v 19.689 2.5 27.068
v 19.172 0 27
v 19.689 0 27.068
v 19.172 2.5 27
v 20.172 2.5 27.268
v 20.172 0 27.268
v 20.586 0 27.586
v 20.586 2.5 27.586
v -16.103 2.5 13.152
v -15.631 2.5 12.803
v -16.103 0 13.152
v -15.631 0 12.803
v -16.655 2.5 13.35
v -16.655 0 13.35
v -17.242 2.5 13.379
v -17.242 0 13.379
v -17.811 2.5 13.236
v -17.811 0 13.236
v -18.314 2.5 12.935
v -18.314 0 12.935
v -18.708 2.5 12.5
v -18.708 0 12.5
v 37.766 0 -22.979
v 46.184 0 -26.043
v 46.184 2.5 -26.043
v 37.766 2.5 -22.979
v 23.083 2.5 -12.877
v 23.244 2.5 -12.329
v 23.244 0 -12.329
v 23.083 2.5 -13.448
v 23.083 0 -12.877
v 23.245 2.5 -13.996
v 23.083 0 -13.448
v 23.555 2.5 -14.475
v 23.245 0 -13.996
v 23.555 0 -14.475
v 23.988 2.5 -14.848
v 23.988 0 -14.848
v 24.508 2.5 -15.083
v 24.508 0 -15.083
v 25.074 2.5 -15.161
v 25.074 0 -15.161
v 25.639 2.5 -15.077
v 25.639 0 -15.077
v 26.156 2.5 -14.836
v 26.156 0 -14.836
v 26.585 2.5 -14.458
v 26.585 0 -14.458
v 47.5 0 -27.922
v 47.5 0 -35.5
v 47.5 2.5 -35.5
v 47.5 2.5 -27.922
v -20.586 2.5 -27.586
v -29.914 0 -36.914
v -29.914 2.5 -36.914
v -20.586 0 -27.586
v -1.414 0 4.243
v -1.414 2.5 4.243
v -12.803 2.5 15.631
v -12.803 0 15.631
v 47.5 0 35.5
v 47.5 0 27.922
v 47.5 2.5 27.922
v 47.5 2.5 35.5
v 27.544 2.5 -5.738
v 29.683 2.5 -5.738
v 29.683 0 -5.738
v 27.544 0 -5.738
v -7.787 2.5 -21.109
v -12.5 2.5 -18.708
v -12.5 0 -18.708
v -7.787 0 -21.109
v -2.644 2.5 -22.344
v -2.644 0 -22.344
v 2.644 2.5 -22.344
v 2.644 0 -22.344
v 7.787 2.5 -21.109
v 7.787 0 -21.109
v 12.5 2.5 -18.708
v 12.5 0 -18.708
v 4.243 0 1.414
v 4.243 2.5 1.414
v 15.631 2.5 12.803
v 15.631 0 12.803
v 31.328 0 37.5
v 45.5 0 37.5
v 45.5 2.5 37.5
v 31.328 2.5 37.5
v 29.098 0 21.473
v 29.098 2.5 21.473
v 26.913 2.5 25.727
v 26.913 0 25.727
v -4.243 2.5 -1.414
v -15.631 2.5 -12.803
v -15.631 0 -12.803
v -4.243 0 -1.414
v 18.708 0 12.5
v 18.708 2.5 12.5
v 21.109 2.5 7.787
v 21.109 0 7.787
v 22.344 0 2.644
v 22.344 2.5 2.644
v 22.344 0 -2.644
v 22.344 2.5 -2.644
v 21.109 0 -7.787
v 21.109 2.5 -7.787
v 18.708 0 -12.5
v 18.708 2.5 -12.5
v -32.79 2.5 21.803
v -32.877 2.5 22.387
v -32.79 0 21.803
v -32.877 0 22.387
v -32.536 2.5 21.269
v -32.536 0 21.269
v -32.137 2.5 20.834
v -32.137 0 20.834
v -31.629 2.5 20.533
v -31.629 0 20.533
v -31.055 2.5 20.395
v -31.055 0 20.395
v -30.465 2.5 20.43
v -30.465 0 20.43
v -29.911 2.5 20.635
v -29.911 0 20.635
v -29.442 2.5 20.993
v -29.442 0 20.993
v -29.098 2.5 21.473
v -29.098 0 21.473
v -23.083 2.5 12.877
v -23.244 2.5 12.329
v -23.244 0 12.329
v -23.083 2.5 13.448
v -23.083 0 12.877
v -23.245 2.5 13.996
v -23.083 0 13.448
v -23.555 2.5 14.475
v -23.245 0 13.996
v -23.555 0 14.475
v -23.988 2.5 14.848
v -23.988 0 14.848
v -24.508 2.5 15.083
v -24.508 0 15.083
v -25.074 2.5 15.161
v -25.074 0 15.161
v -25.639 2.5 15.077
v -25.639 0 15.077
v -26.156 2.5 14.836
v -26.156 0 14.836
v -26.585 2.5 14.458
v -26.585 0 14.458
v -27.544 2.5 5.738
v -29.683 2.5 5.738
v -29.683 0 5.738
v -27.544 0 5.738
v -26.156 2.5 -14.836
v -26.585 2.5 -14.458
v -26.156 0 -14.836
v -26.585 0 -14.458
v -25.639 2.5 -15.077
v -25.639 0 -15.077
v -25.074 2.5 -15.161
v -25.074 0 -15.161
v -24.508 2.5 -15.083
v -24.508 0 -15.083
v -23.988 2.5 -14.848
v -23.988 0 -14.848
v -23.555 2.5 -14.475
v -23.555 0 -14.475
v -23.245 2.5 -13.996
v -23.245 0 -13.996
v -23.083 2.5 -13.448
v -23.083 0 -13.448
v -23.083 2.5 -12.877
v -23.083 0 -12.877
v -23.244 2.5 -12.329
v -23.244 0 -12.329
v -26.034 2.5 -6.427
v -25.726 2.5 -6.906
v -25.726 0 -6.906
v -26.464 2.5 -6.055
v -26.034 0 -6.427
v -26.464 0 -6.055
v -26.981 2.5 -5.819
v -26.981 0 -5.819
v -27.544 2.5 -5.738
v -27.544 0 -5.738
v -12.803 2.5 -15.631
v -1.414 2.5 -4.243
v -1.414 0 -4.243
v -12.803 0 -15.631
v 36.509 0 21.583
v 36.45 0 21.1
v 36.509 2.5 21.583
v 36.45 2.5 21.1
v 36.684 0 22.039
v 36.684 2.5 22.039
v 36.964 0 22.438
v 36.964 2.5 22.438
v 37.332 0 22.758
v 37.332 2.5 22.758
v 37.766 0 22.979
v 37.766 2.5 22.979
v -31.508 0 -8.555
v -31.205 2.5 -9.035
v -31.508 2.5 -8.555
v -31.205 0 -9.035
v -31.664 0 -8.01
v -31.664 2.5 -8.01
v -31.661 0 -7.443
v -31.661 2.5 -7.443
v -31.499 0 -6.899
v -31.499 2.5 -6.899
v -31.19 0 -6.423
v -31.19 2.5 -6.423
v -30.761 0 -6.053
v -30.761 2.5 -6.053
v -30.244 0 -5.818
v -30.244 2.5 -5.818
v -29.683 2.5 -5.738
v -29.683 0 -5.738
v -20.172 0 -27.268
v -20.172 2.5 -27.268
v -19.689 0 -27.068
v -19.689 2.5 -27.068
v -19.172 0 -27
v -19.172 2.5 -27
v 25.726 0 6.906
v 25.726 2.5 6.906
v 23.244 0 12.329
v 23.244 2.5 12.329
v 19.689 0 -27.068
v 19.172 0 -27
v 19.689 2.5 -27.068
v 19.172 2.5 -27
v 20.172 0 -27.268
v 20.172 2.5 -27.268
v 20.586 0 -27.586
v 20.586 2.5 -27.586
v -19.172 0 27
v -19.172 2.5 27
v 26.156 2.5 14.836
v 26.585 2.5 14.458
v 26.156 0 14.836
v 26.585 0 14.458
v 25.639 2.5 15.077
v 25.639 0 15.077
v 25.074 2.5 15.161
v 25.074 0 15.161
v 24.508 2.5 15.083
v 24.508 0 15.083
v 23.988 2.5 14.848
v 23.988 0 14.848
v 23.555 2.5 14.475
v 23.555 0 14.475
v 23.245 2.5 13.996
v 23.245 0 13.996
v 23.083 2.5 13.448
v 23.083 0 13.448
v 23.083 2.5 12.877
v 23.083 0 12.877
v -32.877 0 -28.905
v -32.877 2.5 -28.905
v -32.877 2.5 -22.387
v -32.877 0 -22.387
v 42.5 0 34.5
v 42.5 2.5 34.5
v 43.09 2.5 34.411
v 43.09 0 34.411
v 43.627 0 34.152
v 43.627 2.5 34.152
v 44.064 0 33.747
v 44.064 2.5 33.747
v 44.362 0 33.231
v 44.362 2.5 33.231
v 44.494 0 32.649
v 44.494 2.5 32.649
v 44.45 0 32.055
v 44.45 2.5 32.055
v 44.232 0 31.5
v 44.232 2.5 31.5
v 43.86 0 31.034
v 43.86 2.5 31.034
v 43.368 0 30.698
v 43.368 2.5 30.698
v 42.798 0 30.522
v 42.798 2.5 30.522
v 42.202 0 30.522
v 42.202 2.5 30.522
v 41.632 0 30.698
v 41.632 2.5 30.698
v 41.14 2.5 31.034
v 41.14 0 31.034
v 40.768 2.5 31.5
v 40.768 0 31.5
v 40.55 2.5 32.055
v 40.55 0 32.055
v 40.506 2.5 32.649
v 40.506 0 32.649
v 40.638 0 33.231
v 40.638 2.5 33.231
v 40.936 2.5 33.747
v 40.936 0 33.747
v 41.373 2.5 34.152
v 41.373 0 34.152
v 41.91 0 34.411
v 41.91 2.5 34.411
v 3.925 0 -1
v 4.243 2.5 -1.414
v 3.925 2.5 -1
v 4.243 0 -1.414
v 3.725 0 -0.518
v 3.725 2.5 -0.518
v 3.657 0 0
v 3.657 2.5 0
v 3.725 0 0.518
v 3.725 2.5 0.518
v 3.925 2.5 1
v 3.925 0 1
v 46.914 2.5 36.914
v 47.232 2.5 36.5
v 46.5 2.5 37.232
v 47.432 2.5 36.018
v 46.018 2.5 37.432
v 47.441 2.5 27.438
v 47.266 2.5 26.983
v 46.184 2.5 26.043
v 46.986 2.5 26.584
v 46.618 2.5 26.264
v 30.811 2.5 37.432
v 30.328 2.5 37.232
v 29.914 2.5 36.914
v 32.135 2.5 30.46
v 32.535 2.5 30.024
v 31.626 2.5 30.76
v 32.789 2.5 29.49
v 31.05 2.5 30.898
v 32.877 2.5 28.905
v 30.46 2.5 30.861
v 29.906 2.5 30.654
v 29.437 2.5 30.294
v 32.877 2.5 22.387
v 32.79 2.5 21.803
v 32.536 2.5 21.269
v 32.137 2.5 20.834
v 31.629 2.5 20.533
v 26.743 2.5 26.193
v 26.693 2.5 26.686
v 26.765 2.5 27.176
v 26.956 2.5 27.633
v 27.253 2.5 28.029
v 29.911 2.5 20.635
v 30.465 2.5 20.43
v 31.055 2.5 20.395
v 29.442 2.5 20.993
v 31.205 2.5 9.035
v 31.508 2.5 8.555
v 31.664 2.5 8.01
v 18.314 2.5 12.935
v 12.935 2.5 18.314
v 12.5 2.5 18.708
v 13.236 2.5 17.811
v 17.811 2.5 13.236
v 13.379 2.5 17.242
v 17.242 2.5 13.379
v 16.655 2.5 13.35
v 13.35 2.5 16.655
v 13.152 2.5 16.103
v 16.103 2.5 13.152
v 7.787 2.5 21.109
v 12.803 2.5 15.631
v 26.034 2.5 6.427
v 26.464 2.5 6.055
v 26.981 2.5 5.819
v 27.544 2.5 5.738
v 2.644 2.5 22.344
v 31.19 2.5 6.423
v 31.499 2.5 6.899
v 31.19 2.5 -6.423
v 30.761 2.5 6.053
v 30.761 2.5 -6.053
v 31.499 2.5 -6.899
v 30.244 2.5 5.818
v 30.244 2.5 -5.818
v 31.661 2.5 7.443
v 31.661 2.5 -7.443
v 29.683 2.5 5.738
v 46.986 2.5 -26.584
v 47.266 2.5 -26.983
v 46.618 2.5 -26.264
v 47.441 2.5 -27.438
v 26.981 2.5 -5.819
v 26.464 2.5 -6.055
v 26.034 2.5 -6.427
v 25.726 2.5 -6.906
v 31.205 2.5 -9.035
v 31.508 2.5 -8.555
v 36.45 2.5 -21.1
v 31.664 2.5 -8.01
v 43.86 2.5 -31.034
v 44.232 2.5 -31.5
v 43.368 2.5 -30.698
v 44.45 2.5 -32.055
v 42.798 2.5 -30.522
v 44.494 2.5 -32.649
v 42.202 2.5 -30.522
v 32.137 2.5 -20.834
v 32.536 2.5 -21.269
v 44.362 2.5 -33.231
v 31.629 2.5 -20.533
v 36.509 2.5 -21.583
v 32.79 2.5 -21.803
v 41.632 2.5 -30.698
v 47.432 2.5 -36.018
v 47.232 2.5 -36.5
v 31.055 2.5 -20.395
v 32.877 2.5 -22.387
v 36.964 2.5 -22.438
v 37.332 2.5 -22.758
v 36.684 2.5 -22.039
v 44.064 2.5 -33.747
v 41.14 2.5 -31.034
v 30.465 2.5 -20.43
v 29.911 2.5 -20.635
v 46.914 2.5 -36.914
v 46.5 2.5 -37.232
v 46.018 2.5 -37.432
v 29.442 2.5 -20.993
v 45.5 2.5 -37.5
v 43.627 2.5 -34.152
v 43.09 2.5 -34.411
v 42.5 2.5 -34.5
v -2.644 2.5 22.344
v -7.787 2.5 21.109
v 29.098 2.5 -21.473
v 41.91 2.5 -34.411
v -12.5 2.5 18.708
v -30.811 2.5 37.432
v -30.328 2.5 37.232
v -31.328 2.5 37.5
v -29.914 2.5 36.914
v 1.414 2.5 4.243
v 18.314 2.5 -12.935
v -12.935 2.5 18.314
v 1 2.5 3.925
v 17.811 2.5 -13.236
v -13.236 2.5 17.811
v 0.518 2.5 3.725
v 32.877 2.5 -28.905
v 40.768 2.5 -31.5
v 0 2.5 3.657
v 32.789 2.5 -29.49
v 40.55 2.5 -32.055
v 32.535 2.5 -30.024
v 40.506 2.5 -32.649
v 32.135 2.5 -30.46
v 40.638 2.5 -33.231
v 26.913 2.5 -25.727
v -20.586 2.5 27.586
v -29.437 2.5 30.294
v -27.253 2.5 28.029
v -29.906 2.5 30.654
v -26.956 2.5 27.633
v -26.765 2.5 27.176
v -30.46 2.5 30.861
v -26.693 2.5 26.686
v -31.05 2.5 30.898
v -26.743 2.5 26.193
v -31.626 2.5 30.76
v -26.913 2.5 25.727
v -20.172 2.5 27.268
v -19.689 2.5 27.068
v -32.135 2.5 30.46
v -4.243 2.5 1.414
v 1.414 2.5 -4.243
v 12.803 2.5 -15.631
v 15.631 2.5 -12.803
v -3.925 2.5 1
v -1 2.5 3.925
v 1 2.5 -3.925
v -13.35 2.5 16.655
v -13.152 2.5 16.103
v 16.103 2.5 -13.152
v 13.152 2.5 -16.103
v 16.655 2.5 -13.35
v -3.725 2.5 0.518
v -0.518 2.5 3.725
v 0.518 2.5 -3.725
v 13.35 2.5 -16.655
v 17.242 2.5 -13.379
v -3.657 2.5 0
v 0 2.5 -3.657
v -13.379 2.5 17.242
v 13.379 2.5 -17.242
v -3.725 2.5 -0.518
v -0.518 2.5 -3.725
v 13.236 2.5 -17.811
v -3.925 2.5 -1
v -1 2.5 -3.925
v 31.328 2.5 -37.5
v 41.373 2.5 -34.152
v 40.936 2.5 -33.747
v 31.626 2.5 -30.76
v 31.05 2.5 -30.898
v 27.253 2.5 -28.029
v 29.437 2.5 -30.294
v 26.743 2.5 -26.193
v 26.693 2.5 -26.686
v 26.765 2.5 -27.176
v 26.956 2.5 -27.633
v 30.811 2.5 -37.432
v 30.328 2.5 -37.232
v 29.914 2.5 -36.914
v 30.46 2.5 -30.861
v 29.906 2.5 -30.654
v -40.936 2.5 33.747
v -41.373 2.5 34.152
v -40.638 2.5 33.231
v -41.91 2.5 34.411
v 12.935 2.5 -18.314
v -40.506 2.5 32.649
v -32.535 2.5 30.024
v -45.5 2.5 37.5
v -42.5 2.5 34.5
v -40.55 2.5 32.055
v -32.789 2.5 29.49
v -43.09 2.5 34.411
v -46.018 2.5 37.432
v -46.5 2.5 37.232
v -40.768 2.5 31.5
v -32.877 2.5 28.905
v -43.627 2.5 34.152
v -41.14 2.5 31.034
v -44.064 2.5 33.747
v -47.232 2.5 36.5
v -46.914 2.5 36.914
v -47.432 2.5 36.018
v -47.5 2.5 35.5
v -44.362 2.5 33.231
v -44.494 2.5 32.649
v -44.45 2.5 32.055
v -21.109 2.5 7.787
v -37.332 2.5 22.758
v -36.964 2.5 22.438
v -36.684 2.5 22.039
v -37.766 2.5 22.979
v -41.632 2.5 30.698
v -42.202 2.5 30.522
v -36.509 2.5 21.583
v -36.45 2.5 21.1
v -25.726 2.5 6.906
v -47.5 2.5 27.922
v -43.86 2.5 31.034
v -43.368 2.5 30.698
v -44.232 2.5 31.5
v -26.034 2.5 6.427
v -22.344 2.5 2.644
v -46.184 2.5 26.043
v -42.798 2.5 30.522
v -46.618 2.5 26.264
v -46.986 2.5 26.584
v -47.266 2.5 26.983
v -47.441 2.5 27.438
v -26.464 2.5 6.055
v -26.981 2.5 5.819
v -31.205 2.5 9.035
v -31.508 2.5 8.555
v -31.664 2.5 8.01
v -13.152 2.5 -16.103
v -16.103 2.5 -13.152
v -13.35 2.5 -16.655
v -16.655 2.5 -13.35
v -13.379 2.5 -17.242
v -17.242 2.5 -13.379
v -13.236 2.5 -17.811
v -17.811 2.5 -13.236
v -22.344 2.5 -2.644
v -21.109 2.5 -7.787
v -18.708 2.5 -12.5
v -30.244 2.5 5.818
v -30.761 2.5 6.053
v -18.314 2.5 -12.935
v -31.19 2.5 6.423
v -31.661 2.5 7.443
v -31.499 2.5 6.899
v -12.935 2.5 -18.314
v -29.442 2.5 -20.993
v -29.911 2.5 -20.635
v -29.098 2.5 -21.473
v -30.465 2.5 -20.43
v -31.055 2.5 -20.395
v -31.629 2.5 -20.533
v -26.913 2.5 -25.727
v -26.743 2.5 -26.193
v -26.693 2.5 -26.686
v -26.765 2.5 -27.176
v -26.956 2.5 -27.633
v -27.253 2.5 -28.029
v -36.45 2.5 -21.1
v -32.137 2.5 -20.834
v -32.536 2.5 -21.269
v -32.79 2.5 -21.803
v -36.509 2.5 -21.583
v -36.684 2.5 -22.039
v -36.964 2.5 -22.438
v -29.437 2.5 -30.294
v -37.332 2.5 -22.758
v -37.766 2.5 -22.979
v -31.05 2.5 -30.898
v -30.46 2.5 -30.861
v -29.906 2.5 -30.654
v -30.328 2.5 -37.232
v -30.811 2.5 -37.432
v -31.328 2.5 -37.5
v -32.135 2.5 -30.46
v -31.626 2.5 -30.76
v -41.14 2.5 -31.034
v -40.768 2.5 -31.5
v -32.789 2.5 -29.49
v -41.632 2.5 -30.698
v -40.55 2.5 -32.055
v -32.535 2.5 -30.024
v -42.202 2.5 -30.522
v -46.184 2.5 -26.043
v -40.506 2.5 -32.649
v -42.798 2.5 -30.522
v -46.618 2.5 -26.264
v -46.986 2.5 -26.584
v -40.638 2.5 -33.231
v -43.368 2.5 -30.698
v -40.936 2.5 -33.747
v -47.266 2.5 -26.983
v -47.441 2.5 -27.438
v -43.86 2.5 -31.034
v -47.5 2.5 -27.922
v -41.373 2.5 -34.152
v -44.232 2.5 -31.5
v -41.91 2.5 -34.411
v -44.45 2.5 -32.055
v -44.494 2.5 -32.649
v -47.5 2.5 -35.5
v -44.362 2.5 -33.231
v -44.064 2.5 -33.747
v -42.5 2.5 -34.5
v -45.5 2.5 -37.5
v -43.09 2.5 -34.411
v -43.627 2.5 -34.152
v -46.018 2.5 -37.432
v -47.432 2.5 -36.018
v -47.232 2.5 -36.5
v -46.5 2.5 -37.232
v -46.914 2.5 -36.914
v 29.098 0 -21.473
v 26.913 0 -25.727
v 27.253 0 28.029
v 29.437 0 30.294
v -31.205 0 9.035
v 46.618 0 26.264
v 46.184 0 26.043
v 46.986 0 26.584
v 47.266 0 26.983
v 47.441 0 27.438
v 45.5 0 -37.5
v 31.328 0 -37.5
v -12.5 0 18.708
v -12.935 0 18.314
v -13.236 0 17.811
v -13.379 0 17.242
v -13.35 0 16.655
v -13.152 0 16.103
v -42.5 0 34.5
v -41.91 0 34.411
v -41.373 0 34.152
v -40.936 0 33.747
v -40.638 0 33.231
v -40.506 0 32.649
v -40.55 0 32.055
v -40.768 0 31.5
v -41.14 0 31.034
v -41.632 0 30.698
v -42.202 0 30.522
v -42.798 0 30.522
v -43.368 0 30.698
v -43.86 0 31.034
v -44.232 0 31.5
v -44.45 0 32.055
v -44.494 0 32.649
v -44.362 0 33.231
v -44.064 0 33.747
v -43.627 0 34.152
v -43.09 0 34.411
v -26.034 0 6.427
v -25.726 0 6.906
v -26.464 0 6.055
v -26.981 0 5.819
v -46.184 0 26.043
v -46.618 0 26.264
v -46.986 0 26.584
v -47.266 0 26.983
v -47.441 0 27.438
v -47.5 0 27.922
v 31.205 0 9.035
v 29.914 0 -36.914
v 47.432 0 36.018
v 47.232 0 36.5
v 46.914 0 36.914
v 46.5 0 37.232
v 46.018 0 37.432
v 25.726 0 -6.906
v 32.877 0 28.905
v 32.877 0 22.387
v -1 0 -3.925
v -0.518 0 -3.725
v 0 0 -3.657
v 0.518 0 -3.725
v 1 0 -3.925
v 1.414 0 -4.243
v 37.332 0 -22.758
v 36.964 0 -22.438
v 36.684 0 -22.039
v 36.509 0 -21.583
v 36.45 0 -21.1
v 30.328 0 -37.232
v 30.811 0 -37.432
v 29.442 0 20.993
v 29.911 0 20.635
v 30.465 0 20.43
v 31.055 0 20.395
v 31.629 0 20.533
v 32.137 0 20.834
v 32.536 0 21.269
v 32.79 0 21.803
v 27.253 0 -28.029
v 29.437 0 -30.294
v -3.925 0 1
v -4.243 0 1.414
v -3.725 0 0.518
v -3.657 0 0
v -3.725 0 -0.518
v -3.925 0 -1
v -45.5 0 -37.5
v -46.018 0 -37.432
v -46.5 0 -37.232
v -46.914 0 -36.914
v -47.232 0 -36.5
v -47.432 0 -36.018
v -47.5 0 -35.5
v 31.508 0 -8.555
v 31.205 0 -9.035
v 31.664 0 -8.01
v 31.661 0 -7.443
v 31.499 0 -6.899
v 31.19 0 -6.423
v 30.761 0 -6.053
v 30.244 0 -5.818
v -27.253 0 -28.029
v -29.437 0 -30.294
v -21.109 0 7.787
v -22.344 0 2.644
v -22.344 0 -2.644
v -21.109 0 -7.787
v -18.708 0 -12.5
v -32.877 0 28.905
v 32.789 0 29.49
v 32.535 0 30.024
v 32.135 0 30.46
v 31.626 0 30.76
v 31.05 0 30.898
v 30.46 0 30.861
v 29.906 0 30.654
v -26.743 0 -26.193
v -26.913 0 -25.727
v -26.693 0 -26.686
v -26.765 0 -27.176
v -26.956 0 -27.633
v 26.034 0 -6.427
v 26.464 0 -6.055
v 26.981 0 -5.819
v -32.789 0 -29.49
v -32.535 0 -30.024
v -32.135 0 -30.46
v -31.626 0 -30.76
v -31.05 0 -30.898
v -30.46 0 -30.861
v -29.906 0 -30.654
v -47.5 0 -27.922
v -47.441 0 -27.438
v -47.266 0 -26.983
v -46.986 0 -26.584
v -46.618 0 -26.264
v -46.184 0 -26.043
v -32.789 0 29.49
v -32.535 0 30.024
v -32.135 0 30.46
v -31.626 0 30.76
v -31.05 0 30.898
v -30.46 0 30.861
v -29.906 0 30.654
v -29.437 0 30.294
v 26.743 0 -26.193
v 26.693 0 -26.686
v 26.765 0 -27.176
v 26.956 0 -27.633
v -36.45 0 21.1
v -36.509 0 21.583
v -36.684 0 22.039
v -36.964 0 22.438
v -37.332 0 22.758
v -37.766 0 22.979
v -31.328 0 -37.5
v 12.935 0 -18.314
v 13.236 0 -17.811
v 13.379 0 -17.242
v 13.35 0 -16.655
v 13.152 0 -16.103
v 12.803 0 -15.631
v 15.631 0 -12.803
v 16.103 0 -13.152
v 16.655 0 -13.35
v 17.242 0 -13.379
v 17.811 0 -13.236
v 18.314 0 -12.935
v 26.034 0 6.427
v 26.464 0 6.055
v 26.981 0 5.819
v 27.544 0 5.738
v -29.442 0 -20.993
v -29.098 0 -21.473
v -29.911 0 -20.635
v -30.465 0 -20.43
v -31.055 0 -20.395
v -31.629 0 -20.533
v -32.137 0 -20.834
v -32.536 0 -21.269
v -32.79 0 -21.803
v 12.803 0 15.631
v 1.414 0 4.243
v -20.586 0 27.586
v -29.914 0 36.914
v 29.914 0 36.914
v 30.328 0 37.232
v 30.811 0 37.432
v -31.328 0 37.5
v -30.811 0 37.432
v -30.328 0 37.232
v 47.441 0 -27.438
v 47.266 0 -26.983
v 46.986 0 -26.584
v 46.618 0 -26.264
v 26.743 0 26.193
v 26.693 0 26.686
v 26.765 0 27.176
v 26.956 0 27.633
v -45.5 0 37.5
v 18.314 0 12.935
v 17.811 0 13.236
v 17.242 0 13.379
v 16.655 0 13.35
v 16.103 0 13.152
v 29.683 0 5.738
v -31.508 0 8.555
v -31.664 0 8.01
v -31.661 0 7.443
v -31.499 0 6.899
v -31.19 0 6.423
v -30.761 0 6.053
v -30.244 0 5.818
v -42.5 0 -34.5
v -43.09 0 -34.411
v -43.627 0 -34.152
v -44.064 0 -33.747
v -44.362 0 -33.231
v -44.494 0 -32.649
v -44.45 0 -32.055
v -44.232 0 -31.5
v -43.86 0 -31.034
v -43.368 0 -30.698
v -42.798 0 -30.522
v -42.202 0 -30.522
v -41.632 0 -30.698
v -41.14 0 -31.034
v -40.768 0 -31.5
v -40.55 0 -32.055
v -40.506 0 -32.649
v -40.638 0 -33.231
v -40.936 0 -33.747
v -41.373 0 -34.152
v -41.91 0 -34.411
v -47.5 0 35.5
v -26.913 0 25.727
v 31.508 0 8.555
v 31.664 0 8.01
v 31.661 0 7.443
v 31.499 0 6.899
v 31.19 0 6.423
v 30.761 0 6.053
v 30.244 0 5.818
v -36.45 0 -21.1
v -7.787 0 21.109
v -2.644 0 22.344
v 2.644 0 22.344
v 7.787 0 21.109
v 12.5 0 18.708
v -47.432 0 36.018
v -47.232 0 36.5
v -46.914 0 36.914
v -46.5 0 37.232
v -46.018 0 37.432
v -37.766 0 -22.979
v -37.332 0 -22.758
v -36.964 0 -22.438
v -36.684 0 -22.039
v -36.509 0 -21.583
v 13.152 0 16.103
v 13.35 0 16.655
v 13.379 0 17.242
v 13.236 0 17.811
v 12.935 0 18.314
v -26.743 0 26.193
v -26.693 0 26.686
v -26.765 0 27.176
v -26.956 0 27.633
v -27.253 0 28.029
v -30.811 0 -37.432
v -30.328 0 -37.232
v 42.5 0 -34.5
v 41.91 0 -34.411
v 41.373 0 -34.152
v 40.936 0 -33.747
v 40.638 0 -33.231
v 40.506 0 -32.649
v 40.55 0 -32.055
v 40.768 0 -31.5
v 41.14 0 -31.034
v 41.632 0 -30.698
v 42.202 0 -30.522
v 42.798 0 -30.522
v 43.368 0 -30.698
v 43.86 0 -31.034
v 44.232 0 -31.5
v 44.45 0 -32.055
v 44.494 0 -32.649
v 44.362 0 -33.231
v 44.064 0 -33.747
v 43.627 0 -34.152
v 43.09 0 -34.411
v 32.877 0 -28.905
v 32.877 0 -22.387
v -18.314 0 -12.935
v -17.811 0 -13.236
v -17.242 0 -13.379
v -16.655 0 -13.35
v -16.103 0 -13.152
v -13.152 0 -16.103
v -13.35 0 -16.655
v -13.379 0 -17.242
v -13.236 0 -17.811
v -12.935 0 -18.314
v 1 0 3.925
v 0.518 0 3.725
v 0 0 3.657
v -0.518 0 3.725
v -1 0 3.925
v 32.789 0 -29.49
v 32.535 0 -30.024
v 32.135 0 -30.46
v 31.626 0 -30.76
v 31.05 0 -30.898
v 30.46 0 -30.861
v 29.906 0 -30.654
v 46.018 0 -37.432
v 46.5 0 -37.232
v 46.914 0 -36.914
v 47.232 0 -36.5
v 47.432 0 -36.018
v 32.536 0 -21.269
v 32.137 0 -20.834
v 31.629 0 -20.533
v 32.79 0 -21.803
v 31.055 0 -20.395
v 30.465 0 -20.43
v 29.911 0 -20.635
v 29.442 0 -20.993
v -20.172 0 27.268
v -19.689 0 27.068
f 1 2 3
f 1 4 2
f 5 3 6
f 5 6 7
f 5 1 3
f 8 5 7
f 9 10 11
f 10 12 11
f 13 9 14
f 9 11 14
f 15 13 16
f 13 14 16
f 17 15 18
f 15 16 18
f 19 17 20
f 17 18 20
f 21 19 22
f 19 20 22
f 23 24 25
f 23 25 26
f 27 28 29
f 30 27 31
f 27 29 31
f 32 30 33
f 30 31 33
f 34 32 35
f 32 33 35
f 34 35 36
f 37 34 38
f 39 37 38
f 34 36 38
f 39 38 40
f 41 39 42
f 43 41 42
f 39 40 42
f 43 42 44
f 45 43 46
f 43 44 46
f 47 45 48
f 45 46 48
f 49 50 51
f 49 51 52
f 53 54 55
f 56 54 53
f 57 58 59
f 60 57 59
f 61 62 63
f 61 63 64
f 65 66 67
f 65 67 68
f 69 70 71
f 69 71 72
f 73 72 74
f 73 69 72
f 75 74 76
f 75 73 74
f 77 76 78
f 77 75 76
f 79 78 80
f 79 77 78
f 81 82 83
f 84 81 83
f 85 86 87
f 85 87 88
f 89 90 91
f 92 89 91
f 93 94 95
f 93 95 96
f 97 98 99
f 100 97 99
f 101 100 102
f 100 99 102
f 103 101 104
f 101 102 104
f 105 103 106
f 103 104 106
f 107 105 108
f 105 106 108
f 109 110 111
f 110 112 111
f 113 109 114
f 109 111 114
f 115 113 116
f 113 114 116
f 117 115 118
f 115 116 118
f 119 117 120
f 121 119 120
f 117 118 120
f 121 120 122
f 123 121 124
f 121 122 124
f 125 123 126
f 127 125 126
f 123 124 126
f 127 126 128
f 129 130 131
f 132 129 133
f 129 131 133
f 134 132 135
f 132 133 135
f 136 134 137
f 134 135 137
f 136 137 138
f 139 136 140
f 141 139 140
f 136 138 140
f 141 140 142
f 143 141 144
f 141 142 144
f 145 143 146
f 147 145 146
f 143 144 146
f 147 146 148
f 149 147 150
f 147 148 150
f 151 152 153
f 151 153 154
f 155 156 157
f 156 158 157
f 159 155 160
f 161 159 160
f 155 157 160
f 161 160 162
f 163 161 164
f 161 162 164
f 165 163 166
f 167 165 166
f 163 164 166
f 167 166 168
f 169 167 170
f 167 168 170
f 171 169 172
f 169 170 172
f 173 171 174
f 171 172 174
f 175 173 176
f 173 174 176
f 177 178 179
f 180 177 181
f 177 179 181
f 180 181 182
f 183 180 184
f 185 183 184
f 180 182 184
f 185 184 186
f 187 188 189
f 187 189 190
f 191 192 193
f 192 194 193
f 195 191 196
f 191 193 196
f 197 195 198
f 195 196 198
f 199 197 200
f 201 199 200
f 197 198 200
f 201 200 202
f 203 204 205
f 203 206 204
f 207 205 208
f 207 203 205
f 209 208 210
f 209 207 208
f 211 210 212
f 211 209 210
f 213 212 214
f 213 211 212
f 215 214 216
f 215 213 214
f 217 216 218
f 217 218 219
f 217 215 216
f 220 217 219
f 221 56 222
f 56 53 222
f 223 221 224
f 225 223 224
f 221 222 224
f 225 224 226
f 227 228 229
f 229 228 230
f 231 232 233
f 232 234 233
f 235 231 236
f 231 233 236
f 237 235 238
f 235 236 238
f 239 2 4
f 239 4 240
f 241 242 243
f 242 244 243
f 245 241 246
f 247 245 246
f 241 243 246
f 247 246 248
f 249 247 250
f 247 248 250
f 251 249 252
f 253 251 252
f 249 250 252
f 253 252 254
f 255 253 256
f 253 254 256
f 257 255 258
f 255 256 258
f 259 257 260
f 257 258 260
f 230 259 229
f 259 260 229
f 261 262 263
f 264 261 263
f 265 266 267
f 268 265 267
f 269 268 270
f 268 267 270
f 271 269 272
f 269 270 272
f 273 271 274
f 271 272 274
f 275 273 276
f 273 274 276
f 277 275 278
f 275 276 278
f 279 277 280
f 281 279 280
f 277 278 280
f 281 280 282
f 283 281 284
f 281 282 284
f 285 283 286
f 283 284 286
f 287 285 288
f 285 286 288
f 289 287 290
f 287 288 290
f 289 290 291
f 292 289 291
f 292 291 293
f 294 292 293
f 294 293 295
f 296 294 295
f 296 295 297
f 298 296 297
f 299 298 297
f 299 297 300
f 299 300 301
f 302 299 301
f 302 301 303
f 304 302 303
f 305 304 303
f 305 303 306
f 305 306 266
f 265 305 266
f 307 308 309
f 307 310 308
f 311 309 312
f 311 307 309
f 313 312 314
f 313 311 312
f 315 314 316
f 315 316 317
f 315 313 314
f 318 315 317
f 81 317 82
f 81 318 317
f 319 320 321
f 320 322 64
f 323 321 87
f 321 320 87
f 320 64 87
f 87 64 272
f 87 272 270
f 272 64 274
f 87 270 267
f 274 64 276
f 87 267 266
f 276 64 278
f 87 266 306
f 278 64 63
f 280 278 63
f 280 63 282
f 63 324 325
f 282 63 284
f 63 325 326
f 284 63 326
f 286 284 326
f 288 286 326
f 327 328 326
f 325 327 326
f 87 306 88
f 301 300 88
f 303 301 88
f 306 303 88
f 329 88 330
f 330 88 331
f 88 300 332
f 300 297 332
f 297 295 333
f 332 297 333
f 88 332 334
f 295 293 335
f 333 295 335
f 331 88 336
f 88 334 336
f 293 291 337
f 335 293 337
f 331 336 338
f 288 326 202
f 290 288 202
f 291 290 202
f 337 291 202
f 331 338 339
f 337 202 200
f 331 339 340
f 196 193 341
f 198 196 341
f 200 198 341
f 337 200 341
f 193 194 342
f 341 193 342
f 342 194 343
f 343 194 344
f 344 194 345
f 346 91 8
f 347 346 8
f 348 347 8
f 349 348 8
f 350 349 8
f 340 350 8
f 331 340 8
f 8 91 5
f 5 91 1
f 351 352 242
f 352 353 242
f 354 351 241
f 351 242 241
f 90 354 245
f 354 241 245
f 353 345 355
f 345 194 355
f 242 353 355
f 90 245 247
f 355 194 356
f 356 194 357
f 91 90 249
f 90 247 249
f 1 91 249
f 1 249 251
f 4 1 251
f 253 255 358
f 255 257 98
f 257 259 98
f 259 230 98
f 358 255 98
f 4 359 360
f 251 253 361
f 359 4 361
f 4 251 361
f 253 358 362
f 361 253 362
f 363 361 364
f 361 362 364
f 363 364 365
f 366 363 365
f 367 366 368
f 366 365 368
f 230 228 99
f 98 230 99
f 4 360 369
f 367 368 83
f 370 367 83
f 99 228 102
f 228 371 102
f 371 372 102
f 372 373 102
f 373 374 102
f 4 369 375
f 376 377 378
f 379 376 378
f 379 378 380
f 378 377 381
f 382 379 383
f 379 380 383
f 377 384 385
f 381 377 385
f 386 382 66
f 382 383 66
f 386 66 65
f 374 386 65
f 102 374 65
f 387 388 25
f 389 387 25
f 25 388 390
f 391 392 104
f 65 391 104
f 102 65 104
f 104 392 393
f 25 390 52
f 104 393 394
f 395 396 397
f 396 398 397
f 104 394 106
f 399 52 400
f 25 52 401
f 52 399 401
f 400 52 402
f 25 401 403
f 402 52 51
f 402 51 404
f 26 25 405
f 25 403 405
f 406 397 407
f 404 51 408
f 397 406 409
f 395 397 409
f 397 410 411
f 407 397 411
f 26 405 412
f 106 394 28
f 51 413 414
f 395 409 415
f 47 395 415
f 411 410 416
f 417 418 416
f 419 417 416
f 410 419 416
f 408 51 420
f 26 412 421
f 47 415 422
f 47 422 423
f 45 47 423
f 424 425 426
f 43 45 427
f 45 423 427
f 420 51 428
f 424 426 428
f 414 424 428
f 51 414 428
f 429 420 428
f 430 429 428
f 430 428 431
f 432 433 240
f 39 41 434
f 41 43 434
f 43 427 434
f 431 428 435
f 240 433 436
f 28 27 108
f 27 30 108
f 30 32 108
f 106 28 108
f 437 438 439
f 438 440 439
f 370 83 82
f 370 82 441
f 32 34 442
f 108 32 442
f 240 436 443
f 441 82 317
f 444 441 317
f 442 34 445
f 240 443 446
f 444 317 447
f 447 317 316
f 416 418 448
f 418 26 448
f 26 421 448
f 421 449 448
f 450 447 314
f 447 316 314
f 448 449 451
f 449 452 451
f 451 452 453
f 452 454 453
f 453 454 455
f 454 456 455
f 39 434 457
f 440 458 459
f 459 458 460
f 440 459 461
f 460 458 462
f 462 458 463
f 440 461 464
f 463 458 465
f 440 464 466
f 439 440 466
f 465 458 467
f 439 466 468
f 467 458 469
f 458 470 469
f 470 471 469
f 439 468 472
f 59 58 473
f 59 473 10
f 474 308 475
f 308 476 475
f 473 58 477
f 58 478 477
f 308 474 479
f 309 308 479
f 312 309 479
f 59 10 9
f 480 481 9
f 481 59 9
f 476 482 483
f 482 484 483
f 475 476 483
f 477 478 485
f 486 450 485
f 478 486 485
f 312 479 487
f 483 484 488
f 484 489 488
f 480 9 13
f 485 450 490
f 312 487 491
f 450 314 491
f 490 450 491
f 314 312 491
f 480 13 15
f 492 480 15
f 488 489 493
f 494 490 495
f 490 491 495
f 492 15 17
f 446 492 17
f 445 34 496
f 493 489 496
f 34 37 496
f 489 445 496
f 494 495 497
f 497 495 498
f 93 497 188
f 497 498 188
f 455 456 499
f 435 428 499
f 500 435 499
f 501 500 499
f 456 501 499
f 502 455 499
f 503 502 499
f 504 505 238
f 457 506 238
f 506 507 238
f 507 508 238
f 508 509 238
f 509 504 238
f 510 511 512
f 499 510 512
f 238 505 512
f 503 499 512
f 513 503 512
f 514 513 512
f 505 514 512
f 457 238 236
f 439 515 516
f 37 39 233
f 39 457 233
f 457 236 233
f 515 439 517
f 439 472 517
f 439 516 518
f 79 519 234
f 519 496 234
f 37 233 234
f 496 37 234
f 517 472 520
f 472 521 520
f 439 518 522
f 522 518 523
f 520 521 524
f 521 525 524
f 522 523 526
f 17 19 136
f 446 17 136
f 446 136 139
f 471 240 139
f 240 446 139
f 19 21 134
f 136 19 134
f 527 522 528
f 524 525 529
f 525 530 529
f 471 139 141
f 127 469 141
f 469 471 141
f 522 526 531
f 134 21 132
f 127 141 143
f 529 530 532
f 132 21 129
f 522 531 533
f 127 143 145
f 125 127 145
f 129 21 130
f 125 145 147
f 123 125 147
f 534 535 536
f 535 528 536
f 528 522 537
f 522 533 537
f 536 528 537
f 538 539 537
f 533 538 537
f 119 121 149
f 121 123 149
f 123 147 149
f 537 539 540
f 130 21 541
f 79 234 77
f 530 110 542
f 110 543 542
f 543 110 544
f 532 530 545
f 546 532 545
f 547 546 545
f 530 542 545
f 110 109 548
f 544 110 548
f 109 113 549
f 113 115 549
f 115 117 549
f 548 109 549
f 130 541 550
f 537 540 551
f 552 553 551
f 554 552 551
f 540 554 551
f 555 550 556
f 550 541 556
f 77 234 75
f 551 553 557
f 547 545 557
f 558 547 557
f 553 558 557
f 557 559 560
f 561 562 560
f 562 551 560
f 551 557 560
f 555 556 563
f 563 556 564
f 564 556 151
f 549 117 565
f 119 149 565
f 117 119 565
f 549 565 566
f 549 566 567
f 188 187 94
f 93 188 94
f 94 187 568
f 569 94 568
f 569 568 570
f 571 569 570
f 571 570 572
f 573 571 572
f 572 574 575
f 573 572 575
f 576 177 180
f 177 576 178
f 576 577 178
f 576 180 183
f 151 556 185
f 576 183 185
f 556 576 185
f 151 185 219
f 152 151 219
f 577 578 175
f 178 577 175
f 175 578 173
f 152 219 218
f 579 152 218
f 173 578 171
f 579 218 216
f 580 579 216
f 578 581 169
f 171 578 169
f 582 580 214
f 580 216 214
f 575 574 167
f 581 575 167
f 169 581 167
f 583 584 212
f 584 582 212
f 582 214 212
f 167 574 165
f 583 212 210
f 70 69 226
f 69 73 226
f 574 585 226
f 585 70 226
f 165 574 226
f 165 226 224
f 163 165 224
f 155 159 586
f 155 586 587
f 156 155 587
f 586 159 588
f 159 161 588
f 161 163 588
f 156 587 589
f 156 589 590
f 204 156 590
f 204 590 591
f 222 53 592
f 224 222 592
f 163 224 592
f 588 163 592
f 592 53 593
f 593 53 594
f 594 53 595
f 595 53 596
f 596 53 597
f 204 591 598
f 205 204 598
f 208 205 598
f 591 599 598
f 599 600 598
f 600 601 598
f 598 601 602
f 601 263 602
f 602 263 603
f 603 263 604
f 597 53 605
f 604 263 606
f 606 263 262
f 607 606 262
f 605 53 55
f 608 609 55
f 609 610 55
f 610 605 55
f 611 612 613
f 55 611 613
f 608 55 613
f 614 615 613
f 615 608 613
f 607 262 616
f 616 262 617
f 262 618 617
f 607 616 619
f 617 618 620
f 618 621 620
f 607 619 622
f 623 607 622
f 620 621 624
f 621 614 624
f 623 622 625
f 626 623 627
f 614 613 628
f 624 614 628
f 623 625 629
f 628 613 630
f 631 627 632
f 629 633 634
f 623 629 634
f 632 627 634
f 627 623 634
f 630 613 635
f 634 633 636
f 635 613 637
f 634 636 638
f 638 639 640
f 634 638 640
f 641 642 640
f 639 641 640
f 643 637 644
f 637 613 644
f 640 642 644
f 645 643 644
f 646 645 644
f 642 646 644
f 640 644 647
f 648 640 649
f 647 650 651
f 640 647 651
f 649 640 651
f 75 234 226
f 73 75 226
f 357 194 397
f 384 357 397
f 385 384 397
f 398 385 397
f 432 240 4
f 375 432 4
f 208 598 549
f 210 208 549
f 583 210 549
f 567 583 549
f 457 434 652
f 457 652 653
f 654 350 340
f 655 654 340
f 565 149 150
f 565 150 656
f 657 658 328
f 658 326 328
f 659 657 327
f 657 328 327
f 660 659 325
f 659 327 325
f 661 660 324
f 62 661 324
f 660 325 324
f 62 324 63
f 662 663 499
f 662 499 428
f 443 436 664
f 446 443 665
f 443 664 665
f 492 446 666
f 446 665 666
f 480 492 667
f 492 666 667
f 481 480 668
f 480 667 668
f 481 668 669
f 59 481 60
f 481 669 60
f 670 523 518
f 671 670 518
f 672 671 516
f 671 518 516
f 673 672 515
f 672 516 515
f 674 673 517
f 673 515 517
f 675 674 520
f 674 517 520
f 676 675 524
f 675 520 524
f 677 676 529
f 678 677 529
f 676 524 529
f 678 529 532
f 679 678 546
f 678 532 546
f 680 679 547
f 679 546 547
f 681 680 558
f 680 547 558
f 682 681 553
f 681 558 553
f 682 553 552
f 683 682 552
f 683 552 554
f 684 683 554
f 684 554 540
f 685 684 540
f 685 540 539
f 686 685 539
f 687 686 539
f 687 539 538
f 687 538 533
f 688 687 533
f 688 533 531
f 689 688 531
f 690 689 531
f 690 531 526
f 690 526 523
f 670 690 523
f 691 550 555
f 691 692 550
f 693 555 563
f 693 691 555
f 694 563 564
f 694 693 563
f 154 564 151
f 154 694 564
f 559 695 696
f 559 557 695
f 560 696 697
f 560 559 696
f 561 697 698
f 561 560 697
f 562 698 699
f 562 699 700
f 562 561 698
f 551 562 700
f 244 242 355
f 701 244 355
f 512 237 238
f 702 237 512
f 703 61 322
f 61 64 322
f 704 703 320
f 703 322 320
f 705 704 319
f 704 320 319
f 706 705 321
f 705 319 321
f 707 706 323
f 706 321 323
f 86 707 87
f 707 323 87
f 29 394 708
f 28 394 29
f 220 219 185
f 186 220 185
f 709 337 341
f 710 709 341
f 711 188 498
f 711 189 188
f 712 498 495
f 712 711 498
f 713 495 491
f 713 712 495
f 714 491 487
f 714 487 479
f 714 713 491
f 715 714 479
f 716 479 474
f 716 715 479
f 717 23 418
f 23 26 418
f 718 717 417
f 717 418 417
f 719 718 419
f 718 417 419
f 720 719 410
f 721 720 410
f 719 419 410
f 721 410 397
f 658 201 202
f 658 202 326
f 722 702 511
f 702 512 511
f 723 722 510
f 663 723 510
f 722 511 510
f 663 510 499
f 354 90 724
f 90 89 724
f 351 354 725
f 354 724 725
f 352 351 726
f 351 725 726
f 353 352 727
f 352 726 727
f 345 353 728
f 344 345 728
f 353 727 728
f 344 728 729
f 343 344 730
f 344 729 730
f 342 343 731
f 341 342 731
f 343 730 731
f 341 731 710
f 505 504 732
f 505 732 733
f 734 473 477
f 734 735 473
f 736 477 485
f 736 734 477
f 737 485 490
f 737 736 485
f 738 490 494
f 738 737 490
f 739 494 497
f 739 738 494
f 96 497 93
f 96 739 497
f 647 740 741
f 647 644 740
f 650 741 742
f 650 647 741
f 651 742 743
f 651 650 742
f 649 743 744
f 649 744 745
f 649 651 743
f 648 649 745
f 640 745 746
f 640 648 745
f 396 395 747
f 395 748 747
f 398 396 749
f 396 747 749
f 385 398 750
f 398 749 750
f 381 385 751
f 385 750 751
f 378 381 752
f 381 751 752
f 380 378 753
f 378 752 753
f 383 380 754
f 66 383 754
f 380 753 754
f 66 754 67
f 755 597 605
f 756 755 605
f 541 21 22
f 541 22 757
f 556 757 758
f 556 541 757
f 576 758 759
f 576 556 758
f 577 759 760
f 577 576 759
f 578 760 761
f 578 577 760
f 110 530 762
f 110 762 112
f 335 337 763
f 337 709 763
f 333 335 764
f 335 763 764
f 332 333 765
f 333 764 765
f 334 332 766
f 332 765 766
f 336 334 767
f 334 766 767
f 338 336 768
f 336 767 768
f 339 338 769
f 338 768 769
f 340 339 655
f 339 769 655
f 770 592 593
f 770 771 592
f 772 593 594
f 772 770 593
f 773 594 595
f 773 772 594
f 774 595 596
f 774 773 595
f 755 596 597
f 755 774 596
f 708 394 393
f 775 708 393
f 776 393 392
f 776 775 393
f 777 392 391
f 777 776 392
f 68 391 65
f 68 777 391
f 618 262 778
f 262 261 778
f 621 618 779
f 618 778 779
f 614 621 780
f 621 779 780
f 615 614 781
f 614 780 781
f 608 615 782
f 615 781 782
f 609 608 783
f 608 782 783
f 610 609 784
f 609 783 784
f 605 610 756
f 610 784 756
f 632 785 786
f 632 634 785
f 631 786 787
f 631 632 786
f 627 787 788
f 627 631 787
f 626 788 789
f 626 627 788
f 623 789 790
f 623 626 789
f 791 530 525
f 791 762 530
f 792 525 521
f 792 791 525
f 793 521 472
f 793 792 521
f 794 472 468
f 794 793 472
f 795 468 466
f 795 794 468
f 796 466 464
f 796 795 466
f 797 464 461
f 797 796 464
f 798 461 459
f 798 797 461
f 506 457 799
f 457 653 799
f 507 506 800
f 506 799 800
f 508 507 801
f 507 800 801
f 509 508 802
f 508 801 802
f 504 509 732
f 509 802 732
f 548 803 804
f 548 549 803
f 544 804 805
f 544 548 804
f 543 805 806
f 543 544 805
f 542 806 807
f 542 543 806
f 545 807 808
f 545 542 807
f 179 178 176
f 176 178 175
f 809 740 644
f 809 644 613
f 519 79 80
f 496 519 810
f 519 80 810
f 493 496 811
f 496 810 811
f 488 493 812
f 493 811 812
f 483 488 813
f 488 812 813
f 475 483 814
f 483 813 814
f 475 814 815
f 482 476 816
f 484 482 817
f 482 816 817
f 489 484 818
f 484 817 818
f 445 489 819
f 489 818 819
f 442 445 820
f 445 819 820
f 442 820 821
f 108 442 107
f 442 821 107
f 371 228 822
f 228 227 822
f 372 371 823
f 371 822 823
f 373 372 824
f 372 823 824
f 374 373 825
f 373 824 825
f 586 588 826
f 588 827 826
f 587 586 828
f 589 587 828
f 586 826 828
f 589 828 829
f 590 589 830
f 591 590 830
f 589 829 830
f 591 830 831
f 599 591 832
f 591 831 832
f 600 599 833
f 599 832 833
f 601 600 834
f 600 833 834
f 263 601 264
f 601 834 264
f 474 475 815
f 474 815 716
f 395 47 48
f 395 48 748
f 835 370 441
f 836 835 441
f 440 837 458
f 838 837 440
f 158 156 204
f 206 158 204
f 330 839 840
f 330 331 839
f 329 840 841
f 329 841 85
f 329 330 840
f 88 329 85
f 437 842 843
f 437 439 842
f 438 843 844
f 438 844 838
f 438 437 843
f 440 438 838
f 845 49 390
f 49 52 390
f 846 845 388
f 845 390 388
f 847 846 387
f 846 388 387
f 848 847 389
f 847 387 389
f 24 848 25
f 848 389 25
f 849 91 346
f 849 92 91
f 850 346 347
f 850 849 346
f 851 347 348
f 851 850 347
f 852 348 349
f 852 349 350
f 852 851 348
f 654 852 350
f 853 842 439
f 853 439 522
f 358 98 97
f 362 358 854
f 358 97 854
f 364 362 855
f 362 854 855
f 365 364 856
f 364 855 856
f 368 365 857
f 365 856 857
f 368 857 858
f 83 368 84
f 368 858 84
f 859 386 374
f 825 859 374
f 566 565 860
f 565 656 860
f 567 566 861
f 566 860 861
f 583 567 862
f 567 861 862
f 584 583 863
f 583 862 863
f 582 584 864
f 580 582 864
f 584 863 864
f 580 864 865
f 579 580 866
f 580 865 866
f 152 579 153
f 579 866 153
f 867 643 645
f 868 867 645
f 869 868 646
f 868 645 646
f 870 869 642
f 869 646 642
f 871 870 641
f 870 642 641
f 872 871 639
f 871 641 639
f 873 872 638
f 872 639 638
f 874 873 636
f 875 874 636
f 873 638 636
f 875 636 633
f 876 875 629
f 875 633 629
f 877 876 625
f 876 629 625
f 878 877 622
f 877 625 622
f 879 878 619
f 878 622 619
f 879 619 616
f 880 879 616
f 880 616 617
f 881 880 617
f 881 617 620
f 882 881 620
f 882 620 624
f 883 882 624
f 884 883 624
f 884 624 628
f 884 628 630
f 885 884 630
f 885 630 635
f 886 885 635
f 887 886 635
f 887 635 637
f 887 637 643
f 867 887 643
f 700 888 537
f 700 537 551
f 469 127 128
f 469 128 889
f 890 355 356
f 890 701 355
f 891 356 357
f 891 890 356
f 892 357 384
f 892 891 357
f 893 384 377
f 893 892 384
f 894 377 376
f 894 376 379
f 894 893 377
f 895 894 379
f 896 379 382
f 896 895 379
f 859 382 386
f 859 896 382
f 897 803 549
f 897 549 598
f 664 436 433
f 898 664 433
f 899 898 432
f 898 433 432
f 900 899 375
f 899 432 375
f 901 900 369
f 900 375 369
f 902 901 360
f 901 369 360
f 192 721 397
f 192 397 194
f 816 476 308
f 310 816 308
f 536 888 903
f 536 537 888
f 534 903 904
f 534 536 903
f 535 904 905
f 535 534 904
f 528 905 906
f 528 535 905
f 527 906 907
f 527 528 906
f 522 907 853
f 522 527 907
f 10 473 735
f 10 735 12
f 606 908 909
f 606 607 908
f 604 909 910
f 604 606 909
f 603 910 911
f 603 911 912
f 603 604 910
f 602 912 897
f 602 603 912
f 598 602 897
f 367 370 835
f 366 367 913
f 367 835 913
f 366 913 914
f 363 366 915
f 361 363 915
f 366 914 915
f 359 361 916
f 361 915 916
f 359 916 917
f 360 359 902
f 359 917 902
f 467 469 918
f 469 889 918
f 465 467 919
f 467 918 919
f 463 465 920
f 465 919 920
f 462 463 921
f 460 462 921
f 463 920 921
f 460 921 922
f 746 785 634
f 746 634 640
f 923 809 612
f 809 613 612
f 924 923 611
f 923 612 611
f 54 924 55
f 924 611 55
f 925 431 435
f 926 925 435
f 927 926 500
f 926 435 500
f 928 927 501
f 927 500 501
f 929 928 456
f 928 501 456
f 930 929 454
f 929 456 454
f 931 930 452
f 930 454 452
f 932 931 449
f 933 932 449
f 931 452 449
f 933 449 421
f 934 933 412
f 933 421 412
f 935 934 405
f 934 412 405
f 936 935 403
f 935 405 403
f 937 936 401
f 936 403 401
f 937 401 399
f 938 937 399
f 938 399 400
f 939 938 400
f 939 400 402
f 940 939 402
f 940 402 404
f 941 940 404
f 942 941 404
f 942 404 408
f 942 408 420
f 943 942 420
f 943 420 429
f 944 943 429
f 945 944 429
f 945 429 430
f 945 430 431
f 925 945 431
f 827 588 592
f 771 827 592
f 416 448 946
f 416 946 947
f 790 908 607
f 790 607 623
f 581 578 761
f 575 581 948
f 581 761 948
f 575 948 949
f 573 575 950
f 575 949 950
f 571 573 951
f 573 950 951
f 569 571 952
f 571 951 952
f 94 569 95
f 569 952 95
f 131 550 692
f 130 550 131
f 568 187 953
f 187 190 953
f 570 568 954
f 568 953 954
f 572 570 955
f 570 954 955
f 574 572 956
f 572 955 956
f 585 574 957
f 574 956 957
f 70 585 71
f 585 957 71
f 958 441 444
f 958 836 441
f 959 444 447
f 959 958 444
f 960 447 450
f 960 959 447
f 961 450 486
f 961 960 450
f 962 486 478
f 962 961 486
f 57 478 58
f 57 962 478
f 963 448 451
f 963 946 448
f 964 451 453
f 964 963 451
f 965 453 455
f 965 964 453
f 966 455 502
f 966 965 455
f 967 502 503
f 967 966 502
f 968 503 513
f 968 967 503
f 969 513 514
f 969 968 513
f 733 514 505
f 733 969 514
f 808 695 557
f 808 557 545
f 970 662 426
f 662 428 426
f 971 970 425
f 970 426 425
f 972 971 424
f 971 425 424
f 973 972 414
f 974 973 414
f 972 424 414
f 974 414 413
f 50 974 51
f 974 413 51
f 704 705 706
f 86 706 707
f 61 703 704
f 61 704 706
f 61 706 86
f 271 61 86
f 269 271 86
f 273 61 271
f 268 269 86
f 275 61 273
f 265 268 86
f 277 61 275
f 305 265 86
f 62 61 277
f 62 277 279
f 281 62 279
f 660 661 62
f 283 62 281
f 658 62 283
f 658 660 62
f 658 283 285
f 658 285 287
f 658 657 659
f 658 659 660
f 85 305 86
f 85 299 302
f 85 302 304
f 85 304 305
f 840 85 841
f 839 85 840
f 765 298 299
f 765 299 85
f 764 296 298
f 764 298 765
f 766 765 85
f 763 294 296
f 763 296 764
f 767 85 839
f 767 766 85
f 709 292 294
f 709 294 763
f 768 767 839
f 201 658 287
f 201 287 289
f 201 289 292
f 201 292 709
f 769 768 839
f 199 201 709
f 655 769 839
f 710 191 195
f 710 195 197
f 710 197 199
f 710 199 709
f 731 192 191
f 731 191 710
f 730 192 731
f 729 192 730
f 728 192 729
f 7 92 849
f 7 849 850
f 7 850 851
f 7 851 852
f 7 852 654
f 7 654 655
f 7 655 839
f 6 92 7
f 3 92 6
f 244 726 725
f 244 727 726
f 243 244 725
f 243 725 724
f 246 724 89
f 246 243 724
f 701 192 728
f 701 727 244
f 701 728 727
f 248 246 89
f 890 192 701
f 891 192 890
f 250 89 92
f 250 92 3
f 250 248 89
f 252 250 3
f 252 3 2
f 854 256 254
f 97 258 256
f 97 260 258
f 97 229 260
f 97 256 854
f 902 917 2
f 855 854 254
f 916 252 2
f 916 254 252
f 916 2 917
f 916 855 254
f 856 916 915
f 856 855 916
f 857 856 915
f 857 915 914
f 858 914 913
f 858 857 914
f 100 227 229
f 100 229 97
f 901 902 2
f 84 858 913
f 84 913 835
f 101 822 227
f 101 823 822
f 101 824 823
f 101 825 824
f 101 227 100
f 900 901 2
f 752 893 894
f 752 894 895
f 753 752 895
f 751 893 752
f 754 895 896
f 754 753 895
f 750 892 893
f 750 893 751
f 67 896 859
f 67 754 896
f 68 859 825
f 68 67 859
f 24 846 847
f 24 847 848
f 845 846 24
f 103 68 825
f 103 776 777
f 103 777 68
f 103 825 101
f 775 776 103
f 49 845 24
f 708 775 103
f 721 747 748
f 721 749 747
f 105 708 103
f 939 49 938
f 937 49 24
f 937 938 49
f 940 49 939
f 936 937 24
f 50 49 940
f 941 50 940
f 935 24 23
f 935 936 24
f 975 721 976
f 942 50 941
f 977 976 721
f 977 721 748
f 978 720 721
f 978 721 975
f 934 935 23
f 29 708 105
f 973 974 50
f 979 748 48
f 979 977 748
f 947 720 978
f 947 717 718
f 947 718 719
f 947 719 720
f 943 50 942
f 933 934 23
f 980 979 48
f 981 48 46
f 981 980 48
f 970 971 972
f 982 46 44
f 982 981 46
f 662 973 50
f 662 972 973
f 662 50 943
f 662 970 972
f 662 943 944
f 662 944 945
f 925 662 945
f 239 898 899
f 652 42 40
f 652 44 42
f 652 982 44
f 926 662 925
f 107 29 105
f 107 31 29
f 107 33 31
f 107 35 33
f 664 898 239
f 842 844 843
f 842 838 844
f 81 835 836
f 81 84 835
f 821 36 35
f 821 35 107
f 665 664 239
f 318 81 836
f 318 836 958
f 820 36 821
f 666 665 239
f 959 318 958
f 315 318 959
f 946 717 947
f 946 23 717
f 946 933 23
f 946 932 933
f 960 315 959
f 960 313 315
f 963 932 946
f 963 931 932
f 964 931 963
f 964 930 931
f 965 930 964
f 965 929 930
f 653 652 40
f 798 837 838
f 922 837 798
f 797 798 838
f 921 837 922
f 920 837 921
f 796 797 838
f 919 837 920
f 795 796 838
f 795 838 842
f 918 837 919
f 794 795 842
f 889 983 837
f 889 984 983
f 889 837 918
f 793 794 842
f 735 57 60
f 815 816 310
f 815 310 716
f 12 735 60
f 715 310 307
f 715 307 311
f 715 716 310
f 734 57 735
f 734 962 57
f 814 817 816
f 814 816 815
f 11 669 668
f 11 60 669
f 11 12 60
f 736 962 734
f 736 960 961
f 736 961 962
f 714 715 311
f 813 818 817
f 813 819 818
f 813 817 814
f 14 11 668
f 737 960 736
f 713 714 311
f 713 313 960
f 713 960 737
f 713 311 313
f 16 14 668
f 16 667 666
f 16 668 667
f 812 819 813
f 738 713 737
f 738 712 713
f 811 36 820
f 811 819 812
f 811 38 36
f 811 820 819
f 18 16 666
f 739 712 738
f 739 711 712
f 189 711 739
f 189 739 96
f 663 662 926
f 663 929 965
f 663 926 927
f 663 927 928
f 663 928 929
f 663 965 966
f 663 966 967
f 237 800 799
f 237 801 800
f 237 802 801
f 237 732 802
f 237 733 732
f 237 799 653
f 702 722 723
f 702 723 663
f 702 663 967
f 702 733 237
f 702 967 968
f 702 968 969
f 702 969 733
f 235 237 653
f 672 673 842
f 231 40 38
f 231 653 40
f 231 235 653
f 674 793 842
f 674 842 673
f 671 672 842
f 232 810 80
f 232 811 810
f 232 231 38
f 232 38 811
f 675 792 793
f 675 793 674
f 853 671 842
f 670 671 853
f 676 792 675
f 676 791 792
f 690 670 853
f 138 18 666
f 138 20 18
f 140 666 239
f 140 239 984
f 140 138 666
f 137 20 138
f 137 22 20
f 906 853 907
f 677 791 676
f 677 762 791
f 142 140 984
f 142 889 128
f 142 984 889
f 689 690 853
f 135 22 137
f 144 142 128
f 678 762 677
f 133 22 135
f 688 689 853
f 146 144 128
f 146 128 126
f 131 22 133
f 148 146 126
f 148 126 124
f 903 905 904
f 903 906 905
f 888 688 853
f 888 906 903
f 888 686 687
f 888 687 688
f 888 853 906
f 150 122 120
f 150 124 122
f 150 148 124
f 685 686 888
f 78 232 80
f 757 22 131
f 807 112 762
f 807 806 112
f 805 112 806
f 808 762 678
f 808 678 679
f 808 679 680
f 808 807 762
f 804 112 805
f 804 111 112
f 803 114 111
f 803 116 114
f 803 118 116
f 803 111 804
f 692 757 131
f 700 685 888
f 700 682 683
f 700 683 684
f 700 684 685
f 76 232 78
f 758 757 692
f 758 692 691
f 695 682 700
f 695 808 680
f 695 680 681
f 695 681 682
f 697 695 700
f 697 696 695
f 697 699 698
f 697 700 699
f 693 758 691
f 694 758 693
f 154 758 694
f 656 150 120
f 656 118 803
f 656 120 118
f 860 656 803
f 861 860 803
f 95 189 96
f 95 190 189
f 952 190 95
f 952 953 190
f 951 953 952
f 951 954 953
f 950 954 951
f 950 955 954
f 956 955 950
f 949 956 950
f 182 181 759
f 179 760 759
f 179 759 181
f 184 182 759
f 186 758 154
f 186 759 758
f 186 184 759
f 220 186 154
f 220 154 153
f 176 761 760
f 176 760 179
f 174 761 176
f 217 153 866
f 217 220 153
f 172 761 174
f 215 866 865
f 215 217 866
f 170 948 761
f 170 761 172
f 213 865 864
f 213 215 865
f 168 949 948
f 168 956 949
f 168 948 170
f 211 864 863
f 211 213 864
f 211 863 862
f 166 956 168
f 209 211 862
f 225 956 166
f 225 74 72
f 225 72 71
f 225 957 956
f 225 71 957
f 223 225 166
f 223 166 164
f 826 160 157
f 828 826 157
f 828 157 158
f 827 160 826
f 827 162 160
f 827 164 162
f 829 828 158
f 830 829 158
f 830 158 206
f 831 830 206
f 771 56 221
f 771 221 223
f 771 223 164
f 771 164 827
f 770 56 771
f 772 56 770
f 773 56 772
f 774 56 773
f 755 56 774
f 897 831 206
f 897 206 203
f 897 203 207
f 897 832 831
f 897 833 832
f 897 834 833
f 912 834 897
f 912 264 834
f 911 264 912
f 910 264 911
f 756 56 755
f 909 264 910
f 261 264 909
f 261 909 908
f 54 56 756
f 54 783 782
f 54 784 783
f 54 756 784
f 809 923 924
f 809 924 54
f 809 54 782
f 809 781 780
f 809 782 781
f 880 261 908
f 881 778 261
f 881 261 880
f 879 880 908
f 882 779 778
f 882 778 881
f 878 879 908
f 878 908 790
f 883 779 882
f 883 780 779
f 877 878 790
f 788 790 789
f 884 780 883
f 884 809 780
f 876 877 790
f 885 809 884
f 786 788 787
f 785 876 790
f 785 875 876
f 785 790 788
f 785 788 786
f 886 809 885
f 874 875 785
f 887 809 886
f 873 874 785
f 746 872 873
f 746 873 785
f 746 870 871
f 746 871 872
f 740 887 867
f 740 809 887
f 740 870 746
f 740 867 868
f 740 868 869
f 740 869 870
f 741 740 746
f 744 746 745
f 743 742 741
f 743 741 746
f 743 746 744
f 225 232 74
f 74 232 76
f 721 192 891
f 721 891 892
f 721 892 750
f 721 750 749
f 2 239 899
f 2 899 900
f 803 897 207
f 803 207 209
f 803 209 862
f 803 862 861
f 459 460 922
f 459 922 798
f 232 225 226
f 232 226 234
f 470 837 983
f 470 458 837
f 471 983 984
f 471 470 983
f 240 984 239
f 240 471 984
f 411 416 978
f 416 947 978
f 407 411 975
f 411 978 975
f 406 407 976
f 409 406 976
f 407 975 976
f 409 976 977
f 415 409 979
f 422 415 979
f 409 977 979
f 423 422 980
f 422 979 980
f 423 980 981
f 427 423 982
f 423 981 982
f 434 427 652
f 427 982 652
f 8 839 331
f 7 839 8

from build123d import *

# Parameters (mm, degrees)
EXTRUDE_1_DEPTH     = 2.5
SKETCH_3_R          = 2
CUT_EXTRUDE_1_DEPTH = 61.570207198
CUT_EXTRUDE_2_DEPTH = 61.570207198
FILLET_1_R          = 2
FILLET_2_R          = 2


with BuildPart() as part:
    # 草图2 → 凸台-拉伸1 (new body)
    with BuildSketch(Plane(origin=(0, 0, 0), x_dir=(1, 0, 0), z_dir=(0, 1, 0))):
        Polygon((-47.5, 37.5), (-30.5, 37.5), (-20, 27), (20, 27), (30.5, 37.5), (47.5, 37.5), (47.5, 26.521871089), (36.45, 22.5), (36.45, -22.5), (47.5, -26.521871089), (47.5, -37.5), (30.5, -37.5), (20, -27), (-20, -27), (-30.5, -37.5), (-47.5, -37.5), (-47.5, -26.521871089), (-36.45, -22.5), (-36.45, 22.5), (-47.5, 26.521871089), align=None)
    extrude(amount=EXTRUDE_1_DEPTH)

    # 草图3 → 切除-拉伸1 (cut, through all)
    with BuildSketch(Plane(origin=(0, 2.5, 0), x_dir=(1, 0, 0), z_dir=(0, 1, 0))):
        with Locations(Location((-42.5, -32.5, 0), (0, 0, 270))):
            Circle(SKETCH_3_R)
        with Locations(Location((42.5, -32.5, 0), (0, 0, 270))):
            Circle(SKETCH_3_R)
        with Locations(Location((42.5, 32.5, 0), (0, 0, 90))):
            Circle(SKETCH_3_R)
        with Locations(Location((-42.5, 32.5, 0), (0, 0, 90))):
            Circle(SKETCH_3_R)
    extrude(amount=-CUT_EXTRUDE_1_DEPTH, mode=Mode.SUBTRACT)

    # 草图4 → 切除-拉伸2 (cut, through all)
    with BuildSketch(Plane(origin=(0, 2.5, 0), x_dir=(1, 0, 0), z_dir=(0, 1, 0))):
        with BuildLine():
            Line((14.432710429, 17.261137554), (0, 2.828427125))
            Line((0, 2.828427125), (-14.432710429, 17.261137554))
            ThreePointArc((-14.432710429, 17.261137554), (0, 22.5), (14.432710429, 17.261137554))
        make_face()
        with BuildLine():
            Line((17.261137554, 14.432710429), (2.828427125, 0))
            Line((2.828427125, 0), (17.261137554, -14.432710429))
            ThreePointArc((17.261137554, -14.432710429), (22.5, 0), (17.261137554, 14.432710429))
        make_face()
        with BuildLine():
            Line((14.432710429, -17.261137554), (0, -2.828427125))
            Line((0, -2.828427125), (-14.432710429, -17.261137554))
            ThreePointArc((-14.432710429, -17.261137554), (0, -22.5), (14.432710429, -17.261137554))
        make_face()
        with BuildLine():
            Line((-17.261137554, 14.432710429), (-2.828427125, 0))
            Line((-2.828427125, 0), (-17.261137554, -14.432710429))
            ThreePointArc((-17.261137554, -14.432710429), (-22.5, 0), (-17.261137554, 14.432710429))
        make_face()
        Polygon((-17.261137554, 25.402553145), (-34.014066988, 5.737935313), (-26.260100349, 5.737935313), align=None)
        Polygon((-32.876818547, 14.112219282), (-26.260100349, 27), (-32.876818547, 33.858987655), align=None)
        Polygon((26.260100349, 27), (32.876818547, 33.858987655), (32.876818547, 14.112219282), align=None)
        Polygon((34.014066988, 5.737935313), (26.260100349, 5.737935313), (17.261137554, 25.402553145), align=None)
        Polygon((32.876818547, -14.112219282), (26.260100349, -27), (32.876818547, -33.858987655), align=None)
        Polygon((17.261137554, -25.402553145), (34.014066988, -5.737935313), (26.260100349, -5.737935313), align=None)
        Polygon((-26.260100349, -27), (-32.876818547, -33.858987655), (-32.876818547, -14.112219282), align=None)
        Polygon((-34.014066988, -5.737935313), (-26.260100349, -5.737935313), (-17.261137554, -25.402553145), align=None)
    extrude(amount=-CUT_EXTRUDE_2_DEPTH, mode=Mode.SUBTRACT)

    # 圆角1
    fillet_1_edges = [part.edges().sort_by_distance(p)[0] for p in [
        (-32.876818547, 1.25, -14.112219282),
        (-32.876818547, 1.25, -33.858987655),
        (-26.260100349, 1.25, -27),
        (32.876818547, 1.25, -14.112219282),
        (26.260100349, 1.25, -27),
        (32.876818547, 1.25, -33.858987655),
        (17.261137554, 1.25, -25.402553145),
        (34.014066988, 1.25, -5.737935313),
        (26.260100349, 1.25, -5.737935313),
        (32.876818547, 1.25, 14.112219282),
        (32.876818547, 1.25, 33.858987655),
        (26.260100349, 1.25, 27),
        (14.432710429, 1.25, 17.261137554),
        (-14.432710429, 1.25, 17.261137554),
        (0, 1.25, 2.828427125),
        (17.261137554, 1.25, -14.432710429),
        (17.261137554, 1.25, 14.432710429),
        (2.828427125, 1.25, 0),
        (-17.261137554, 1.25, -25.402553145),
        (-26.260100349, 1.25, -5.737935313),
        (-34.014066988, 1.25, -5.737935313),
        (-17.261137554, 1.25, 14.432710429),
        (-17.261137554, 1.25, -14.432710429),
        (-2.828427125, 1.25, 0),
        (-17.261137554, 1.25, 25.402553145),
        (-34.014066988, 1.25, 5.737935313),
        (-26.260100349, 1.25, 5.737935313),
        (-32.876818547, 1.25, 14.112219282),
        (-26.260100349, 1.25, 27),
        (-32.876818547, 1.25, 33.858987655),
        (17.261137554, 1.25, 25.402553145),
        (26.260100349, 1.25, 5.737935313),
        (34.014066988, 1.25, 5.737935313),
        (-14.432710429, 1.25, -17.261137554),
        (14.432710429, 1.25, -17.261137554),
        (0, 1.25, -2.828427125),
    ]]
    fillet(fillet_1_edges, radius=FILLET_1_R)

    # 圆角2
    fillet_2_edges = [part.edges().sort_by_distance(p)[0] for p in [
        (30.5, 1.25, 37.5),
        (20, 1.25, 27),
        (-20, 1.25, 27),
        (-30.5, 1.25, 37.5),
        (-47.5, 1.25, 37.5),
        (-47.5, 1.25, 26.521871089),
        (-36.45, 1.25, 22.5),
        (-36.45, 1.25, -22.5),
        (-47.5, 1.25, -26.521871089),
        (-47.5, 1.25, -37.5),
        (-30.5, 1.25, -37.5),
        (-20, 1.25, -27),
        (20, 1.25, -27),
        (30.5, 1.25, -37.5),
        (47.5, 1.25, -37.5),
        (47.5, 1.25, -26.521871089),
        (36.45, 1.25, -22.5),
        (36.45, 1.25, 22.5),
        (47.5, 1.25, 26.521871089),
        (47.5, 1.25, 37.5),
    ]]
    fillet(fillet_2_edges, radius=FILLET_2_R)


solid = part.part
